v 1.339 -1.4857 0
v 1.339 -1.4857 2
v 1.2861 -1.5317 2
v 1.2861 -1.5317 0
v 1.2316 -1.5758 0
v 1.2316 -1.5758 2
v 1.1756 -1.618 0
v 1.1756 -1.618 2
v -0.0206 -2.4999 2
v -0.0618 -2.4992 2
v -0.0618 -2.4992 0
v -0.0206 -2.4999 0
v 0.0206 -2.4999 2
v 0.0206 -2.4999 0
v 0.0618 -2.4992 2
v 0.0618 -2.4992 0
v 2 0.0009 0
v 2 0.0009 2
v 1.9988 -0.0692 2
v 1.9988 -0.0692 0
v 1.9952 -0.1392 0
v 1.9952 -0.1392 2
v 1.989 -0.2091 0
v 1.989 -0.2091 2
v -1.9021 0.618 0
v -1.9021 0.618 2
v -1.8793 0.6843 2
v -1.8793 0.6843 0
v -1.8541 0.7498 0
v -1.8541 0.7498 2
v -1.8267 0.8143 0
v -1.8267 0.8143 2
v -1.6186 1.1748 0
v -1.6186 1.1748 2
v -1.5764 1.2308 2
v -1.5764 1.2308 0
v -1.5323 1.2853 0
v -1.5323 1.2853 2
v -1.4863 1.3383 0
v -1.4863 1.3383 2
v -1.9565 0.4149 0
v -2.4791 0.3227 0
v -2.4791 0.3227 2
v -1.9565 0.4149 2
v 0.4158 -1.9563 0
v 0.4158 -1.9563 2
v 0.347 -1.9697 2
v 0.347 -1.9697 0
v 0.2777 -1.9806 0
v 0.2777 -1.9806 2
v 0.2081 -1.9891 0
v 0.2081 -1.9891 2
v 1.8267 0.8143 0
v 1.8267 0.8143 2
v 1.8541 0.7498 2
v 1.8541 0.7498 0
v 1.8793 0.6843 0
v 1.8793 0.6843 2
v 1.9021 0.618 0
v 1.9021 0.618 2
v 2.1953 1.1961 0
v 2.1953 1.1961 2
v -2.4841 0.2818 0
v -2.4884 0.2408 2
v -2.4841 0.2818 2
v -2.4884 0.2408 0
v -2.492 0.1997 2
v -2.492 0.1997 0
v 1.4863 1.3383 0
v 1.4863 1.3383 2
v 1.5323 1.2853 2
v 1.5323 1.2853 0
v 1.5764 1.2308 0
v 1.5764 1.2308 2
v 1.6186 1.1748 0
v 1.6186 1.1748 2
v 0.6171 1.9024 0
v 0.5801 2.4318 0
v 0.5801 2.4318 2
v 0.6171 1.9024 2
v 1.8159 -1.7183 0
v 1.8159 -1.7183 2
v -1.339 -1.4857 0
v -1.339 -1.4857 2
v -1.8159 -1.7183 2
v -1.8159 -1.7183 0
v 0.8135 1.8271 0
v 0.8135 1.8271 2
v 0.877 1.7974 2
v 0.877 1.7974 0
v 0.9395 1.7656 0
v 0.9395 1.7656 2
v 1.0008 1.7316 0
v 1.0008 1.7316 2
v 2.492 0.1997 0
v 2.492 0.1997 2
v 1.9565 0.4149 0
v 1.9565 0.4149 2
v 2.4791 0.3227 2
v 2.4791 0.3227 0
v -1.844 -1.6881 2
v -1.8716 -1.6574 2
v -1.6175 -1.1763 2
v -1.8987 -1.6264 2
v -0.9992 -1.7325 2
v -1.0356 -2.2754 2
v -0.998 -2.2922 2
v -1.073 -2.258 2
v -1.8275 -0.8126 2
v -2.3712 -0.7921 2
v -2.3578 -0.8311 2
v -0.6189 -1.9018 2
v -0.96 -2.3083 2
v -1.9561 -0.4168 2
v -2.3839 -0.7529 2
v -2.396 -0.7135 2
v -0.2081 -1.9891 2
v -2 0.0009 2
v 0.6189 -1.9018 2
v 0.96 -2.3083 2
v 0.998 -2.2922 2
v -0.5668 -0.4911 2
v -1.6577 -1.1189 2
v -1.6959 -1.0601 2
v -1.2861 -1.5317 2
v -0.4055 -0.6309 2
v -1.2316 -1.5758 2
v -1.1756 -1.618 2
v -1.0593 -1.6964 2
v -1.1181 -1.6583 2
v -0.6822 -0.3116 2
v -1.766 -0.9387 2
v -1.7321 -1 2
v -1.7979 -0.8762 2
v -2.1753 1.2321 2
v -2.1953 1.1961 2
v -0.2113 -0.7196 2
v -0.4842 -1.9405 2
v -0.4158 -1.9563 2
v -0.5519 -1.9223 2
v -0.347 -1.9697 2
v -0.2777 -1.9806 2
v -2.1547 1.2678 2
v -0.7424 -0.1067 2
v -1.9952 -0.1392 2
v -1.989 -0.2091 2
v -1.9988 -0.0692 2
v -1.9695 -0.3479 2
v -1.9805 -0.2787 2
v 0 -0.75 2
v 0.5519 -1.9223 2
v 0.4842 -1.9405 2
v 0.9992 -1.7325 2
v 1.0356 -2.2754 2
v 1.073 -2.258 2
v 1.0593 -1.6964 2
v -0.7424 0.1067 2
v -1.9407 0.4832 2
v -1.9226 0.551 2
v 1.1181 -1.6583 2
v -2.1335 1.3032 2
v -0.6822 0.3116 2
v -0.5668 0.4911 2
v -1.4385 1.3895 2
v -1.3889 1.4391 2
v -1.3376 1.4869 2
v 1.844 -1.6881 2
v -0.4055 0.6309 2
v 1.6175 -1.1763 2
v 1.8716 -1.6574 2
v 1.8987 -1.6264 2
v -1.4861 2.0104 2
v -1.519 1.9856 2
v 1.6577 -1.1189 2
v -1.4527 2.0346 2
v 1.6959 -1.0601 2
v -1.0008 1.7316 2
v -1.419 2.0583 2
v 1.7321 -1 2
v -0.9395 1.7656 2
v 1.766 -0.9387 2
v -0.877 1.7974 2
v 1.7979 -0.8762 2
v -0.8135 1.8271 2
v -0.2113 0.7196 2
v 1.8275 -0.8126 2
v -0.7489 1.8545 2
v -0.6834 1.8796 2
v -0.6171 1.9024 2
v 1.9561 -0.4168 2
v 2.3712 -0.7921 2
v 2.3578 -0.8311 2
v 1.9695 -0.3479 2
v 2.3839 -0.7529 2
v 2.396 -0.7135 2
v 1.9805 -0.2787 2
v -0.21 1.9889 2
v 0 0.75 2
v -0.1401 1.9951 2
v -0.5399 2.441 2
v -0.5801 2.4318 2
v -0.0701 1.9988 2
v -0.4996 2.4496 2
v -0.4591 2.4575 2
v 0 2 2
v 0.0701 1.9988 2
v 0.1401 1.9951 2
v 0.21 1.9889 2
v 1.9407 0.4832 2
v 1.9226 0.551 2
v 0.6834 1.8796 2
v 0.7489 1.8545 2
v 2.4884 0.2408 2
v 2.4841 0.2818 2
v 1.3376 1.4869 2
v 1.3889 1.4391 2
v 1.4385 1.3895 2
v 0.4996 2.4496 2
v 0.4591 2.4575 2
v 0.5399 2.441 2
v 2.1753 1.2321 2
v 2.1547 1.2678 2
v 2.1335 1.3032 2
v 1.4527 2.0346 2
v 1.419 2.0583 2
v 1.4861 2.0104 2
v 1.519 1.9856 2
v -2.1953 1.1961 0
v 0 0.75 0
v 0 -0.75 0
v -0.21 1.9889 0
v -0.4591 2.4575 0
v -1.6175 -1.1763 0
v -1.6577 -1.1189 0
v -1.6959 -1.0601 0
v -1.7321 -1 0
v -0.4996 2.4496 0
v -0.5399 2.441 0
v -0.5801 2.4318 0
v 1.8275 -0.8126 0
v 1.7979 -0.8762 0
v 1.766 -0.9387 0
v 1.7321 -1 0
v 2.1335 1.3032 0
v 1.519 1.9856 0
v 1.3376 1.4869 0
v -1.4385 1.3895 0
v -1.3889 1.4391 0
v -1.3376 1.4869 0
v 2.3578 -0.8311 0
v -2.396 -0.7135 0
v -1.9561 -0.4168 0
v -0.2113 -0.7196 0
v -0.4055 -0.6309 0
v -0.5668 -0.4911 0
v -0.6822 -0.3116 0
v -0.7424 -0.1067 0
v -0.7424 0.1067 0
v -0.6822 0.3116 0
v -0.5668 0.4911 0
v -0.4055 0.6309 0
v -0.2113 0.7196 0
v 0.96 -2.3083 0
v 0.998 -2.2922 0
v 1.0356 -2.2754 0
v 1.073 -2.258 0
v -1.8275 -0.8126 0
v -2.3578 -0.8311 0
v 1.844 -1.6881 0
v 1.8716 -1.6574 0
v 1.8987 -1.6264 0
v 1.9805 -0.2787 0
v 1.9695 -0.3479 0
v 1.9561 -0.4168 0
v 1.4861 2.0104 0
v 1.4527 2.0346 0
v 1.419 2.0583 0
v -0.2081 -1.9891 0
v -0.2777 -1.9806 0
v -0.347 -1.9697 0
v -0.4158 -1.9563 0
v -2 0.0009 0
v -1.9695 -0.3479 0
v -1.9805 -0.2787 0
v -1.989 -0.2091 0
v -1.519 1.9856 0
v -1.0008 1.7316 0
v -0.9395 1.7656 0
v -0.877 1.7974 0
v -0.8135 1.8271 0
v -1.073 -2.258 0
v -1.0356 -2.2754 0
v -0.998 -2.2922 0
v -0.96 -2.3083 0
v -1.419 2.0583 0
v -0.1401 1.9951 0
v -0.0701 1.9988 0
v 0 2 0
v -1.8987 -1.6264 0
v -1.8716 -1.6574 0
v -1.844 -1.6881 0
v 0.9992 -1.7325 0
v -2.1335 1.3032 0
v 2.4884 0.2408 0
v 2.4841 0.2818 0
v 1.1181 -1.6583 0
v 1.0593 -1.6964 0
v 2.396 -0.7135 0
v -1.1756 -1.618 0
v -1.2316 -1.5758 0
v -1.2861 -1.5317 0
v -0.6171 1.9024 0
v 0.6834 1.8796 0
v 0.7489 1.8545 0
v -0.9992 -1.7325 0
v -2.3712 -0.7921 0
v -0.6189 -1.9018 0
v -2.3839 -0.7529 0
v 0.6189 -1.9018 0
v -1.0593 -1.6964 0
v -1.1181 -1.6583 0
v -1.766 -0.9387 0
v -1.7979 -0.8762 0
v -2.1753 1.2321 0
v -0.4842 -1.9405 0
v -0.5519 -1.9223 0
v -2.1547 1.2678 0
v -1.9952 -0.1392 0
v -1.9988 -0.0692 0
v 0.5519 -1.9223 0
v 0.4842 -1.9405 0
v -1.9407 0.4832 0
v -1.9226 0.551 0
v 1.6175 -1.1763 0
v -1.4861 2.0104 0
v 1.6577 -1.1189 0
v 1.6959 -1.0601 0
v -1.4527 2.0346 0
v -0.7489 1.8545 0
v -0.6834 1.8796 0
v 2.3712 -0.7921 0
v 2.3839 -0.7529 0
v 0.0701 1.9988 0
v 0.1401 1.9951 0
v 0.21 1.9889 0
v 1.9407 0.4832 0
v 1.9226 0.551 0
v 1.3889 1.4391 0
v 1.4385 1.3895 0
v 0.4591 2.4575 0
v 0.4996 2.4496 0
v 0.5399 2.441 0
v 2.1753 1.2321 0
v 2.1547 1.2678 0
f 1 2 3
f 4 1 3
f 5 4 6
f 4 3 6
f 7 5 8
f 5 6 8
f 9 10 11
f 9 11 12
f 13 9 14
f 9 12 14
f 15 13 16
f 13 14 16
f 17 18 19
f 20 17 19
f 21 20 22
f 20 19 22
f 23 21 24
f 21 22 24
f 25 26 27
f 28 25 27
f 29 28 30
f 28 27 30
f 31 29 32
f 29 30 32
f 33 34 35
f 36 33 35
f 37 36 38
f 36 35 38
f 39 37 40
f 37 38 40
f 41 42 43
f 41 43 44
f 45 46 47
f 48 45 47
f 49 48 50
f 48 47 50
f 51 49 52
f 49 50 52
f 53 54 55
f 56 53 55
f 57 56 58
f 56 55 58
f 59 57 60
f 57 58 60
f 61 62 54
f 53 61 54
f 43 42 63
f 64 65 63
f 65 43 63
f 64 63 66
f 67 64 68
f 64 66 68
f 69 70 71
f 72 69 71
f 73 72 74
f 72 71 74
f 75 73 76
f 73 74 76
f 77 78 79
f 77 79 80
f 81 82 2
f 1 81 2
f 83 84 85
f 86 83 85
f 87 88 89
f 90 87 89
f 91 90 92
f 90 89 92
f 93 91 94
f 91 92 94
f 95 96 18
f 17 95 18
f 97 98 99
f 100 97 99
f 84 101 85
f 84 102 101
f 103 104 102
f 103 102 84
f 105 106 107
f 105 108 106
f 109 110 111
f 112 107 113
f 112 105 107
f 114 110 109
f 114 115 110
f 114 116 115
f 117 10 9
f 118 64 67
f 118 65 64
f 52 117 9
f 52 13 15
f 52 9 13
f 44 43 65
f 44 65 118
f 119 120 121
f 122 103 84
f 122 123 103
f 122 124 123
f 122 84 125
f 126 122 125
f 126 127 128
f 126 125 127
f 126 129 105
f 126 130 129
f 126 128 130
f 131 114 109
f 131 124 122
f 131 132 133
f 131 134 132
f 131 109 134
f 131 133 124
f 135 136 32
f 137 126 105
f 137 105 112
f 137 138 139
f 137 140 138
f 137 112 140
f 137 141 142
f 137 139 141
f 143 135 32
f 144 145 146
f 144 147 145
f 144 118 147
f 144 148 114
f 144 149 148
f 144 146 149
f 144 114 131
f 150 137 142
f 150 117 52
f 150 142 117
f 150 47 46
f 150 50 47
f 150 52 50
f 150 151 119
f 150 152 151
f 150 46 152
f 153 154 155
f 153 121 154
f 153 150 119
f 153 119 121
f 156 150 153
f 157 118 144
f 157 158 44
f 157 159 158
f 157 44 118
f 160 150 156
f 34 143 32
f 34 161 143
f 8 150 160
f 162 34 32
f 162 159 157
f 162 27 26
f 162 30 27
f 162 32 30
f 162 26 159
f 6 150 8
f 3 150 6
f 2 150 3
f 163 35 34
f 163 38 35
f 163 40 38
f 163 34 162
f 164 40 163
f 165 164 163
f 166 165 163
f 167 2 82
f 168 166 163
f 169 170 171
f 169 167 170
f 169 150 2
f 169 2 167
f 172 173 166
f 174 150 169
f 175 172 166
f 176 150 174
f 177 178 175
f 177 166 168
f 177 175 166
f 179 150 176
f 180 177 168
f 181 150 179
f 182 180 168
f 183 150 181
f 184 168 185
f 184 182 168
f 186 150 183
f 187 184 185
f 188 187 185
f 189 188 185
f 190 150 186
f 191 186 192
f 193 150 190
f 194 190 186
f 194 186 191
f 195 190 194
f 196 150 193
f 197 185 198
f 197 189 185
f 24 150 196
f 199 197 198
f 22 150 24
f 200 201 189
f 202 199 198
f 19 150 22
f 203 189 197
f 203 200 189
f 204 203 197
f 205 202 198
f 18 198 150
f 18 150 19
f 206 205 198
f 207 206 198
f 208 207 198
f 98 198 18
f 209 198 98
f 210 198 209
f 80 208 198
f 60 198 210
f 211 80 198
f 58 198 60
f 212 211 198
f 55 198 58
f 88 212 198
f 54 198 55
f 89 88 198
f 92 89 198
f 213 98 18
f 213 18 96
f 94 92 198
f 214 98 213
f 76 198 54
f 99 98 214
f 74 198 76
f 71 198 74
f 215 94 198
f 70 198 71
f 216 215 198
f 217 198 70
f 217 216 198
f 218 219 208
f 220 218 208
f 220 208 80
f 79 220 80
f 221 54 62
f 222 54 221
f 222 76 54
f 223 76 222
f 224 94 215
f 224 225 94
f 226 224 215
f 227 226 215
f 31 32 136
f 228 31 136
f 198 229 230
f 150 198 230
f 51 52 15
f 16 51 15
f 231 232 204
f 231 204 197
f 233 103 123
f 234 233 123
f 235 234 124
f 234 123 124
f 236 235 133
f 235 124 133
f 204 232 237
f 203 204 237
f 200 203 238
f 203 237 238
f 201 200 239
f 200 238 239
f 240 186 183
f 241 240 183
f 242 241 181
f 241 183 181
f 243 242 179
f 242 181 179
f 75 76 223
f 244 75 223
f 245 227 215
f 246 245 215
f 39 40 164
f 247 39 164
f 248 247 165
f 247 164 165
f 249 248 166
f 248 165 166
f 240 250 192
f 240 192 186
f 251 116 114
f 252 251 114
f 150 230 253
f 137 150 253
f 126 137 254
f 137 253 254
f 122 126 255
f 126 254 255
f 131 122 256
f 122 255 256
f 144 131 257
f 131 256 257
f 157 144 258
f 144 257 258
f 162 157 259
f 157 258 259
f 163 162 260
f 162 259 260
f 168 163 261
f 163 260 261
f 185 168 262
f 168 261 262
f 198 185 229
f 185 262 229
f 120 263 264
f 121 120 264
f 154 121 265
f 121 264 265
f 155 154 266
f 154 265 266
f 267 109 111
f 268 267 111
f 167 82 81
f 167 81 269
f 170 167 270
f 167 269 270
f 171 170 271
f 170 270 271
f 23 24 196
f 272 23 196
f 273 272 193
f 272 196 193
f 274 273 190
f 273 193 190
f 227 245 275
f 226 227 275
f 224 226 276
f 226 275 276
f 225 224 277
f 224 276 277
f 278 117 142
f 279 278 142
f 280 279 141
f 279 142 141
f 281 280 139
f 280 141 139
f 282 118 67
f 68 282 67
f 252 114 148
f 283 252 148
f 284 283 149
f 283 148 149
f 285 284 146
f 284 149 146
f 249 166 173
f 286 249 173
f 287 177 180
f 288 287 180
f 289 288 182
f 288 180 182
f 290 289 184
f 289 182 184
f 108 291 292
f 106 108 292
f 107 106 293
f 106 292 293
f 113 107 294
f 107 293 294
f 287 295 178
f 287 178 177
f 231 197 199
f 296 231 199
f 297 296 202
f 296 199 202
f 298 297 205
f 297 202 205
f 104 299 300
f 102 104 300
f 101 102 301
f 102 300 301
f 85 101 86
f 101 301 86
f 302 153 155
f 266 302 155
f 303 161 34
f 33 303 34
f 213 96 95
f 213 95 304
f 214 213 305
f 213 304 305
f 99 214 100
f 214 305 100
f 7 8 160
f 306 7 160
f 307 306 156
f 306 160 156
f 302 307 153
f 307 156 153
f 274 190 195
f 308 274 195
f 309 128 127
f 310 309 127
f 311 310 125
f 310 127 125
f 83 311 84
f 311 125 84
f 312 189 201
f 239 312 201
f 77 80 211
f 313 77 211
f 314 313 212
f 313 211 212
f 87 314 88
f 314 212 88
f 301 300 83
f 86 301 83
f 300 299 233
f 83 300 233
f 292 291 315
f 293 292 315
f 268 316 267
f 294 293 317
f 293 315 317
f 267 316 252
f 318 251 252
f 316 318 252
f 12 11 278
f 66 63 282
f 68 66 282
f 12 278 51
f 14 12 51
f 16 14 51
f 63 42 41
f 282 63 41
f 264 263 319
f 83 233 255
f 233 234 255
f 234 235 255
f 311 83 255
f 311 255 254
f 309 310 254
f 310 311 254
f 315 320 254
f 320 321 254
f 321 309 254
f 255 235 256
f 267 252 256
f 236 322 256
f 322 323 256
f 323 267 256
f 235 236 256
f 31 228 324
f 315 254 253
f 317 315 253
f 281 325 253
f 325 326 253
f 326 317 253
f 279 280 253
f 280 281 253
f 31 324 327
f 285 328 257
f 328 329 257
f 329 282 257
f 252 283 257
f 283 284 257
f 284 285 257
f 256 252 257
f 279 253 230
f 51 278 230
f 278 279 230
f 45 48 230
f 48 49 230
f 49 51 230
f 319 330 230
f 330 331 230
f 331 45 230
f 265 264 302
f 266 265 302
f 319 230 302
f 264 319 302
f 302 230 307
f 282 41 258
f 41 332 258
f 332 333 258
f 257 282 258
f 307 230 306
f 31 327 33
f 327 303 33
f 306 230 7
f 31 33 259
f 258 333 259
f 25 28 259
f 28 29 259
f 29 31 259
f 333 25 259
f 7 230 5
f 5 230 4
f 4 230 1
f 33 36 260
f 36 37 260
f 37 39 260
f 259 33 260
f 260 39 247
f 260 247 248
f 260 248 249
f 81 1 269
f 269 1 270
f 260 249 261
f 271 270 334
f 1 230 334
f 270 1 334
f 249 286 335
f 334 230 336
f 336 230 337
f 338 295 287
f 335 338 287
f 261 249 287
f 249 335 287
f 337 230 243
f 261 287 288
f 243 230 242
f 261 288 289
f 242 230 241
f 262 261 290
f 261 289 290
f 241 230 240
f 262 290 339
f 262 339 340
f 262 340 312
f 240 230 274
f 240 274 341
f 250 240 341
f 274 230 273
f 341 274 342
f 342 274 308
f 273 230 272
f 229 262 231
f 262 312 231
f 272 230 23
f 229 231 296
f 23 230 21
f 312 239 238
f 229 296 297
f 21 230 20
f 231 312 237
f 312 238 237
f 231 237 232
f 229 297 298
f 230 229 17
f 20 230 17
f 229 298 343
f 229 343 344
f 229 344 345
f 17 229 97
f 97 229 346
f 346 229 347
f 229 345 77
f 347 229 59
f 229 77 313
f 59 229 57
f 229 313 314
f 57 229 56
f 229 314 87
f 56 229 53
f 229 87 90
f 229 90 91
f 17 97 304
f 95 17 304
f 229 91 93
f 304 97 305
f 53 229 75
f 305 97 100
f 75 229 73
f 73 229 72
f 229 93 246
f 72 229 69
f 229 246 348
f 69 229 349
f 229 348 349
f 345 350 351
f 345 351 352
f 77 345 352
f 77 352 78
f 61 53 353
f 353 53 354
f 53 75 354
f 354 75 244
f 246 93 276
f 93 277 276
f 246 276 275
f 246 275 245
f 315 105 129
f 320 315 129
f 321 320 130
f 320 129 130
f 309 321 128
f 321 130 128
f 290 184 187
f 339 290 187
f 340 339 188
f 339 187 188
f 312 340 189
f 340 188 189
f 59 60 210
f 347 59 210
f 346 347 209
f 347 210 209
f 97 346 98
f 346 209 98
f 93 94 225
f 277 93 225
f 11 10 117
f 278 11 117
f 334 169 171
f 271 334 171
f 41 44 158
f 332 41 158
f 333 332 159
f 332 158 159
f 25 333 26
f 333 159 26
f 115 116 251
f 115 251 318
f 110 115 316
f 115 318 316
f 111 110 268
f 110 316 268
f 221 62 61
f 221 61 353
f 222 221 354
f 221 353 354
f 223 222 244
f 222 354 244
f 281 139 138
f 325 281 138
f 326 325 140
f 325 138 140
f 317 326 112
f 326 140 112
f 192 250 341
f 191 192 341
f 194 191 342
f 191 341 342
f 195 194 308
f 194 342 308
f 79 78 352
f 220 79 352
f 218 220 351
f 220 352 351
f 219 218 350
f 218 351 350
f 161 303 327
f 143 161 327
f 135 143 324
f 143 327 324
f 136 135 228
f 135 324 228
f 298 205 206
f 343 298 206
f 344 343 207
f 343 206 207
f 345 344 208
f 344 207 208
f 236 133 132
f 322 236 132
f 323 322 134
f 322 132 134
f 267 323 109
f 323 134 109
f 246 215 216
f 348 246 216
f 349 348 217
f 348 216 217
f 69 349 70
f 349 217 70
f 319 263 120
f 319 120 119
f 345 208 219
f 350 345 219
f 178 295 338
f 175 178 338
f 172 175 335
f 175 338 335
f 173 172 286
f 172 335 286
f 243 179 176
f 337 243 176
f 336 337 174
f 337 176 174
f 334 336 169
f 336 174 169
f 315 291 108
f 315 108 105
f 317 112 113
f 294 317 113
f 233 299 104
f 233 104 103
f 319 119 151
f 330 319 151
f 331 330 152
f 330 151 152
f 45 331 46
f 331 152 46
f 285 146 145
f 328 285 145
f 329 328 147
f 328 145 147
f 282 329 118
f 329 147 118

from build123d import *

# Parameters (mm, degrees)
SKETCH1_R           = 2.5
BOSS_EXTRUDE1_DEPTH = 2
CUT_EXTRUDE2_DEPTH  = 2
CIRPATTERN2_COUNT   = 15


with BuildPart() as part:
    # Sketch1 → Boss-Extrude1 (new body)
    with BuildSketch(Plane.XY):
        Circle(SKETCH1_R)
        with BuildLine():
            Line((0, 0.75), (0, -0.75))
            ThreePointArc((0, -0.75), (-0.75, 0), (0, 0.75))
        make_face(mode=Mode.SUBTRACT)
    extrude(amount=BOSS_EXTRUDE1_DEPTH)

    # Sketch2 → Cut-Extrude2 (cut)
    with BuildSketch(Plane.XY.offset(2)):
        with BuildLine():
            ThreePointArc((-0.21, 1.988944444), (-0.105145406, 1.997234199), (0, 2))
            Line((0, 2), (0, 2.514078411))
            ThreePointArc((0, 2.514078411), (-0.2340411, 2.503161005), (-0.466049549, 2.470503607))
            Line((-0.466049549, 2.470503607), (-0.21, 1.988944444))
        make_face()
        with BuildLine():
            Line((0, 2.514078411), (0, 2))
            ThreePointArc((0, 2), (0.105145406, 1.997234199), (0.21, 1.988944444))
            Line((0.21, 1.988944444), (0.466049549, 2.470503607))
            ThreePointArc((0.466049549, 2.470503607), (0.2340411, 2.503161005), (0, 2.514078411))
        make_face()
    cut_extrude2 = extrude(amount=-CUT_EXTRUDE2_DEPTH, mode=Mode.SUBTRACT)

    # CirPattern2: Cut-Extrude2 ×15 about axis
    cirpattern2_axis = Axis((0, 0, 0), (0, 0, 1))
    for i in range(1, CIRPATTERN2_COUNT):
        add(cut_extrude2.rotate(cirpattern2_axis, i * 360 / CIRPATTERN2_COUNT), mode=Mode.SUBTRACT)


solid = part.part
